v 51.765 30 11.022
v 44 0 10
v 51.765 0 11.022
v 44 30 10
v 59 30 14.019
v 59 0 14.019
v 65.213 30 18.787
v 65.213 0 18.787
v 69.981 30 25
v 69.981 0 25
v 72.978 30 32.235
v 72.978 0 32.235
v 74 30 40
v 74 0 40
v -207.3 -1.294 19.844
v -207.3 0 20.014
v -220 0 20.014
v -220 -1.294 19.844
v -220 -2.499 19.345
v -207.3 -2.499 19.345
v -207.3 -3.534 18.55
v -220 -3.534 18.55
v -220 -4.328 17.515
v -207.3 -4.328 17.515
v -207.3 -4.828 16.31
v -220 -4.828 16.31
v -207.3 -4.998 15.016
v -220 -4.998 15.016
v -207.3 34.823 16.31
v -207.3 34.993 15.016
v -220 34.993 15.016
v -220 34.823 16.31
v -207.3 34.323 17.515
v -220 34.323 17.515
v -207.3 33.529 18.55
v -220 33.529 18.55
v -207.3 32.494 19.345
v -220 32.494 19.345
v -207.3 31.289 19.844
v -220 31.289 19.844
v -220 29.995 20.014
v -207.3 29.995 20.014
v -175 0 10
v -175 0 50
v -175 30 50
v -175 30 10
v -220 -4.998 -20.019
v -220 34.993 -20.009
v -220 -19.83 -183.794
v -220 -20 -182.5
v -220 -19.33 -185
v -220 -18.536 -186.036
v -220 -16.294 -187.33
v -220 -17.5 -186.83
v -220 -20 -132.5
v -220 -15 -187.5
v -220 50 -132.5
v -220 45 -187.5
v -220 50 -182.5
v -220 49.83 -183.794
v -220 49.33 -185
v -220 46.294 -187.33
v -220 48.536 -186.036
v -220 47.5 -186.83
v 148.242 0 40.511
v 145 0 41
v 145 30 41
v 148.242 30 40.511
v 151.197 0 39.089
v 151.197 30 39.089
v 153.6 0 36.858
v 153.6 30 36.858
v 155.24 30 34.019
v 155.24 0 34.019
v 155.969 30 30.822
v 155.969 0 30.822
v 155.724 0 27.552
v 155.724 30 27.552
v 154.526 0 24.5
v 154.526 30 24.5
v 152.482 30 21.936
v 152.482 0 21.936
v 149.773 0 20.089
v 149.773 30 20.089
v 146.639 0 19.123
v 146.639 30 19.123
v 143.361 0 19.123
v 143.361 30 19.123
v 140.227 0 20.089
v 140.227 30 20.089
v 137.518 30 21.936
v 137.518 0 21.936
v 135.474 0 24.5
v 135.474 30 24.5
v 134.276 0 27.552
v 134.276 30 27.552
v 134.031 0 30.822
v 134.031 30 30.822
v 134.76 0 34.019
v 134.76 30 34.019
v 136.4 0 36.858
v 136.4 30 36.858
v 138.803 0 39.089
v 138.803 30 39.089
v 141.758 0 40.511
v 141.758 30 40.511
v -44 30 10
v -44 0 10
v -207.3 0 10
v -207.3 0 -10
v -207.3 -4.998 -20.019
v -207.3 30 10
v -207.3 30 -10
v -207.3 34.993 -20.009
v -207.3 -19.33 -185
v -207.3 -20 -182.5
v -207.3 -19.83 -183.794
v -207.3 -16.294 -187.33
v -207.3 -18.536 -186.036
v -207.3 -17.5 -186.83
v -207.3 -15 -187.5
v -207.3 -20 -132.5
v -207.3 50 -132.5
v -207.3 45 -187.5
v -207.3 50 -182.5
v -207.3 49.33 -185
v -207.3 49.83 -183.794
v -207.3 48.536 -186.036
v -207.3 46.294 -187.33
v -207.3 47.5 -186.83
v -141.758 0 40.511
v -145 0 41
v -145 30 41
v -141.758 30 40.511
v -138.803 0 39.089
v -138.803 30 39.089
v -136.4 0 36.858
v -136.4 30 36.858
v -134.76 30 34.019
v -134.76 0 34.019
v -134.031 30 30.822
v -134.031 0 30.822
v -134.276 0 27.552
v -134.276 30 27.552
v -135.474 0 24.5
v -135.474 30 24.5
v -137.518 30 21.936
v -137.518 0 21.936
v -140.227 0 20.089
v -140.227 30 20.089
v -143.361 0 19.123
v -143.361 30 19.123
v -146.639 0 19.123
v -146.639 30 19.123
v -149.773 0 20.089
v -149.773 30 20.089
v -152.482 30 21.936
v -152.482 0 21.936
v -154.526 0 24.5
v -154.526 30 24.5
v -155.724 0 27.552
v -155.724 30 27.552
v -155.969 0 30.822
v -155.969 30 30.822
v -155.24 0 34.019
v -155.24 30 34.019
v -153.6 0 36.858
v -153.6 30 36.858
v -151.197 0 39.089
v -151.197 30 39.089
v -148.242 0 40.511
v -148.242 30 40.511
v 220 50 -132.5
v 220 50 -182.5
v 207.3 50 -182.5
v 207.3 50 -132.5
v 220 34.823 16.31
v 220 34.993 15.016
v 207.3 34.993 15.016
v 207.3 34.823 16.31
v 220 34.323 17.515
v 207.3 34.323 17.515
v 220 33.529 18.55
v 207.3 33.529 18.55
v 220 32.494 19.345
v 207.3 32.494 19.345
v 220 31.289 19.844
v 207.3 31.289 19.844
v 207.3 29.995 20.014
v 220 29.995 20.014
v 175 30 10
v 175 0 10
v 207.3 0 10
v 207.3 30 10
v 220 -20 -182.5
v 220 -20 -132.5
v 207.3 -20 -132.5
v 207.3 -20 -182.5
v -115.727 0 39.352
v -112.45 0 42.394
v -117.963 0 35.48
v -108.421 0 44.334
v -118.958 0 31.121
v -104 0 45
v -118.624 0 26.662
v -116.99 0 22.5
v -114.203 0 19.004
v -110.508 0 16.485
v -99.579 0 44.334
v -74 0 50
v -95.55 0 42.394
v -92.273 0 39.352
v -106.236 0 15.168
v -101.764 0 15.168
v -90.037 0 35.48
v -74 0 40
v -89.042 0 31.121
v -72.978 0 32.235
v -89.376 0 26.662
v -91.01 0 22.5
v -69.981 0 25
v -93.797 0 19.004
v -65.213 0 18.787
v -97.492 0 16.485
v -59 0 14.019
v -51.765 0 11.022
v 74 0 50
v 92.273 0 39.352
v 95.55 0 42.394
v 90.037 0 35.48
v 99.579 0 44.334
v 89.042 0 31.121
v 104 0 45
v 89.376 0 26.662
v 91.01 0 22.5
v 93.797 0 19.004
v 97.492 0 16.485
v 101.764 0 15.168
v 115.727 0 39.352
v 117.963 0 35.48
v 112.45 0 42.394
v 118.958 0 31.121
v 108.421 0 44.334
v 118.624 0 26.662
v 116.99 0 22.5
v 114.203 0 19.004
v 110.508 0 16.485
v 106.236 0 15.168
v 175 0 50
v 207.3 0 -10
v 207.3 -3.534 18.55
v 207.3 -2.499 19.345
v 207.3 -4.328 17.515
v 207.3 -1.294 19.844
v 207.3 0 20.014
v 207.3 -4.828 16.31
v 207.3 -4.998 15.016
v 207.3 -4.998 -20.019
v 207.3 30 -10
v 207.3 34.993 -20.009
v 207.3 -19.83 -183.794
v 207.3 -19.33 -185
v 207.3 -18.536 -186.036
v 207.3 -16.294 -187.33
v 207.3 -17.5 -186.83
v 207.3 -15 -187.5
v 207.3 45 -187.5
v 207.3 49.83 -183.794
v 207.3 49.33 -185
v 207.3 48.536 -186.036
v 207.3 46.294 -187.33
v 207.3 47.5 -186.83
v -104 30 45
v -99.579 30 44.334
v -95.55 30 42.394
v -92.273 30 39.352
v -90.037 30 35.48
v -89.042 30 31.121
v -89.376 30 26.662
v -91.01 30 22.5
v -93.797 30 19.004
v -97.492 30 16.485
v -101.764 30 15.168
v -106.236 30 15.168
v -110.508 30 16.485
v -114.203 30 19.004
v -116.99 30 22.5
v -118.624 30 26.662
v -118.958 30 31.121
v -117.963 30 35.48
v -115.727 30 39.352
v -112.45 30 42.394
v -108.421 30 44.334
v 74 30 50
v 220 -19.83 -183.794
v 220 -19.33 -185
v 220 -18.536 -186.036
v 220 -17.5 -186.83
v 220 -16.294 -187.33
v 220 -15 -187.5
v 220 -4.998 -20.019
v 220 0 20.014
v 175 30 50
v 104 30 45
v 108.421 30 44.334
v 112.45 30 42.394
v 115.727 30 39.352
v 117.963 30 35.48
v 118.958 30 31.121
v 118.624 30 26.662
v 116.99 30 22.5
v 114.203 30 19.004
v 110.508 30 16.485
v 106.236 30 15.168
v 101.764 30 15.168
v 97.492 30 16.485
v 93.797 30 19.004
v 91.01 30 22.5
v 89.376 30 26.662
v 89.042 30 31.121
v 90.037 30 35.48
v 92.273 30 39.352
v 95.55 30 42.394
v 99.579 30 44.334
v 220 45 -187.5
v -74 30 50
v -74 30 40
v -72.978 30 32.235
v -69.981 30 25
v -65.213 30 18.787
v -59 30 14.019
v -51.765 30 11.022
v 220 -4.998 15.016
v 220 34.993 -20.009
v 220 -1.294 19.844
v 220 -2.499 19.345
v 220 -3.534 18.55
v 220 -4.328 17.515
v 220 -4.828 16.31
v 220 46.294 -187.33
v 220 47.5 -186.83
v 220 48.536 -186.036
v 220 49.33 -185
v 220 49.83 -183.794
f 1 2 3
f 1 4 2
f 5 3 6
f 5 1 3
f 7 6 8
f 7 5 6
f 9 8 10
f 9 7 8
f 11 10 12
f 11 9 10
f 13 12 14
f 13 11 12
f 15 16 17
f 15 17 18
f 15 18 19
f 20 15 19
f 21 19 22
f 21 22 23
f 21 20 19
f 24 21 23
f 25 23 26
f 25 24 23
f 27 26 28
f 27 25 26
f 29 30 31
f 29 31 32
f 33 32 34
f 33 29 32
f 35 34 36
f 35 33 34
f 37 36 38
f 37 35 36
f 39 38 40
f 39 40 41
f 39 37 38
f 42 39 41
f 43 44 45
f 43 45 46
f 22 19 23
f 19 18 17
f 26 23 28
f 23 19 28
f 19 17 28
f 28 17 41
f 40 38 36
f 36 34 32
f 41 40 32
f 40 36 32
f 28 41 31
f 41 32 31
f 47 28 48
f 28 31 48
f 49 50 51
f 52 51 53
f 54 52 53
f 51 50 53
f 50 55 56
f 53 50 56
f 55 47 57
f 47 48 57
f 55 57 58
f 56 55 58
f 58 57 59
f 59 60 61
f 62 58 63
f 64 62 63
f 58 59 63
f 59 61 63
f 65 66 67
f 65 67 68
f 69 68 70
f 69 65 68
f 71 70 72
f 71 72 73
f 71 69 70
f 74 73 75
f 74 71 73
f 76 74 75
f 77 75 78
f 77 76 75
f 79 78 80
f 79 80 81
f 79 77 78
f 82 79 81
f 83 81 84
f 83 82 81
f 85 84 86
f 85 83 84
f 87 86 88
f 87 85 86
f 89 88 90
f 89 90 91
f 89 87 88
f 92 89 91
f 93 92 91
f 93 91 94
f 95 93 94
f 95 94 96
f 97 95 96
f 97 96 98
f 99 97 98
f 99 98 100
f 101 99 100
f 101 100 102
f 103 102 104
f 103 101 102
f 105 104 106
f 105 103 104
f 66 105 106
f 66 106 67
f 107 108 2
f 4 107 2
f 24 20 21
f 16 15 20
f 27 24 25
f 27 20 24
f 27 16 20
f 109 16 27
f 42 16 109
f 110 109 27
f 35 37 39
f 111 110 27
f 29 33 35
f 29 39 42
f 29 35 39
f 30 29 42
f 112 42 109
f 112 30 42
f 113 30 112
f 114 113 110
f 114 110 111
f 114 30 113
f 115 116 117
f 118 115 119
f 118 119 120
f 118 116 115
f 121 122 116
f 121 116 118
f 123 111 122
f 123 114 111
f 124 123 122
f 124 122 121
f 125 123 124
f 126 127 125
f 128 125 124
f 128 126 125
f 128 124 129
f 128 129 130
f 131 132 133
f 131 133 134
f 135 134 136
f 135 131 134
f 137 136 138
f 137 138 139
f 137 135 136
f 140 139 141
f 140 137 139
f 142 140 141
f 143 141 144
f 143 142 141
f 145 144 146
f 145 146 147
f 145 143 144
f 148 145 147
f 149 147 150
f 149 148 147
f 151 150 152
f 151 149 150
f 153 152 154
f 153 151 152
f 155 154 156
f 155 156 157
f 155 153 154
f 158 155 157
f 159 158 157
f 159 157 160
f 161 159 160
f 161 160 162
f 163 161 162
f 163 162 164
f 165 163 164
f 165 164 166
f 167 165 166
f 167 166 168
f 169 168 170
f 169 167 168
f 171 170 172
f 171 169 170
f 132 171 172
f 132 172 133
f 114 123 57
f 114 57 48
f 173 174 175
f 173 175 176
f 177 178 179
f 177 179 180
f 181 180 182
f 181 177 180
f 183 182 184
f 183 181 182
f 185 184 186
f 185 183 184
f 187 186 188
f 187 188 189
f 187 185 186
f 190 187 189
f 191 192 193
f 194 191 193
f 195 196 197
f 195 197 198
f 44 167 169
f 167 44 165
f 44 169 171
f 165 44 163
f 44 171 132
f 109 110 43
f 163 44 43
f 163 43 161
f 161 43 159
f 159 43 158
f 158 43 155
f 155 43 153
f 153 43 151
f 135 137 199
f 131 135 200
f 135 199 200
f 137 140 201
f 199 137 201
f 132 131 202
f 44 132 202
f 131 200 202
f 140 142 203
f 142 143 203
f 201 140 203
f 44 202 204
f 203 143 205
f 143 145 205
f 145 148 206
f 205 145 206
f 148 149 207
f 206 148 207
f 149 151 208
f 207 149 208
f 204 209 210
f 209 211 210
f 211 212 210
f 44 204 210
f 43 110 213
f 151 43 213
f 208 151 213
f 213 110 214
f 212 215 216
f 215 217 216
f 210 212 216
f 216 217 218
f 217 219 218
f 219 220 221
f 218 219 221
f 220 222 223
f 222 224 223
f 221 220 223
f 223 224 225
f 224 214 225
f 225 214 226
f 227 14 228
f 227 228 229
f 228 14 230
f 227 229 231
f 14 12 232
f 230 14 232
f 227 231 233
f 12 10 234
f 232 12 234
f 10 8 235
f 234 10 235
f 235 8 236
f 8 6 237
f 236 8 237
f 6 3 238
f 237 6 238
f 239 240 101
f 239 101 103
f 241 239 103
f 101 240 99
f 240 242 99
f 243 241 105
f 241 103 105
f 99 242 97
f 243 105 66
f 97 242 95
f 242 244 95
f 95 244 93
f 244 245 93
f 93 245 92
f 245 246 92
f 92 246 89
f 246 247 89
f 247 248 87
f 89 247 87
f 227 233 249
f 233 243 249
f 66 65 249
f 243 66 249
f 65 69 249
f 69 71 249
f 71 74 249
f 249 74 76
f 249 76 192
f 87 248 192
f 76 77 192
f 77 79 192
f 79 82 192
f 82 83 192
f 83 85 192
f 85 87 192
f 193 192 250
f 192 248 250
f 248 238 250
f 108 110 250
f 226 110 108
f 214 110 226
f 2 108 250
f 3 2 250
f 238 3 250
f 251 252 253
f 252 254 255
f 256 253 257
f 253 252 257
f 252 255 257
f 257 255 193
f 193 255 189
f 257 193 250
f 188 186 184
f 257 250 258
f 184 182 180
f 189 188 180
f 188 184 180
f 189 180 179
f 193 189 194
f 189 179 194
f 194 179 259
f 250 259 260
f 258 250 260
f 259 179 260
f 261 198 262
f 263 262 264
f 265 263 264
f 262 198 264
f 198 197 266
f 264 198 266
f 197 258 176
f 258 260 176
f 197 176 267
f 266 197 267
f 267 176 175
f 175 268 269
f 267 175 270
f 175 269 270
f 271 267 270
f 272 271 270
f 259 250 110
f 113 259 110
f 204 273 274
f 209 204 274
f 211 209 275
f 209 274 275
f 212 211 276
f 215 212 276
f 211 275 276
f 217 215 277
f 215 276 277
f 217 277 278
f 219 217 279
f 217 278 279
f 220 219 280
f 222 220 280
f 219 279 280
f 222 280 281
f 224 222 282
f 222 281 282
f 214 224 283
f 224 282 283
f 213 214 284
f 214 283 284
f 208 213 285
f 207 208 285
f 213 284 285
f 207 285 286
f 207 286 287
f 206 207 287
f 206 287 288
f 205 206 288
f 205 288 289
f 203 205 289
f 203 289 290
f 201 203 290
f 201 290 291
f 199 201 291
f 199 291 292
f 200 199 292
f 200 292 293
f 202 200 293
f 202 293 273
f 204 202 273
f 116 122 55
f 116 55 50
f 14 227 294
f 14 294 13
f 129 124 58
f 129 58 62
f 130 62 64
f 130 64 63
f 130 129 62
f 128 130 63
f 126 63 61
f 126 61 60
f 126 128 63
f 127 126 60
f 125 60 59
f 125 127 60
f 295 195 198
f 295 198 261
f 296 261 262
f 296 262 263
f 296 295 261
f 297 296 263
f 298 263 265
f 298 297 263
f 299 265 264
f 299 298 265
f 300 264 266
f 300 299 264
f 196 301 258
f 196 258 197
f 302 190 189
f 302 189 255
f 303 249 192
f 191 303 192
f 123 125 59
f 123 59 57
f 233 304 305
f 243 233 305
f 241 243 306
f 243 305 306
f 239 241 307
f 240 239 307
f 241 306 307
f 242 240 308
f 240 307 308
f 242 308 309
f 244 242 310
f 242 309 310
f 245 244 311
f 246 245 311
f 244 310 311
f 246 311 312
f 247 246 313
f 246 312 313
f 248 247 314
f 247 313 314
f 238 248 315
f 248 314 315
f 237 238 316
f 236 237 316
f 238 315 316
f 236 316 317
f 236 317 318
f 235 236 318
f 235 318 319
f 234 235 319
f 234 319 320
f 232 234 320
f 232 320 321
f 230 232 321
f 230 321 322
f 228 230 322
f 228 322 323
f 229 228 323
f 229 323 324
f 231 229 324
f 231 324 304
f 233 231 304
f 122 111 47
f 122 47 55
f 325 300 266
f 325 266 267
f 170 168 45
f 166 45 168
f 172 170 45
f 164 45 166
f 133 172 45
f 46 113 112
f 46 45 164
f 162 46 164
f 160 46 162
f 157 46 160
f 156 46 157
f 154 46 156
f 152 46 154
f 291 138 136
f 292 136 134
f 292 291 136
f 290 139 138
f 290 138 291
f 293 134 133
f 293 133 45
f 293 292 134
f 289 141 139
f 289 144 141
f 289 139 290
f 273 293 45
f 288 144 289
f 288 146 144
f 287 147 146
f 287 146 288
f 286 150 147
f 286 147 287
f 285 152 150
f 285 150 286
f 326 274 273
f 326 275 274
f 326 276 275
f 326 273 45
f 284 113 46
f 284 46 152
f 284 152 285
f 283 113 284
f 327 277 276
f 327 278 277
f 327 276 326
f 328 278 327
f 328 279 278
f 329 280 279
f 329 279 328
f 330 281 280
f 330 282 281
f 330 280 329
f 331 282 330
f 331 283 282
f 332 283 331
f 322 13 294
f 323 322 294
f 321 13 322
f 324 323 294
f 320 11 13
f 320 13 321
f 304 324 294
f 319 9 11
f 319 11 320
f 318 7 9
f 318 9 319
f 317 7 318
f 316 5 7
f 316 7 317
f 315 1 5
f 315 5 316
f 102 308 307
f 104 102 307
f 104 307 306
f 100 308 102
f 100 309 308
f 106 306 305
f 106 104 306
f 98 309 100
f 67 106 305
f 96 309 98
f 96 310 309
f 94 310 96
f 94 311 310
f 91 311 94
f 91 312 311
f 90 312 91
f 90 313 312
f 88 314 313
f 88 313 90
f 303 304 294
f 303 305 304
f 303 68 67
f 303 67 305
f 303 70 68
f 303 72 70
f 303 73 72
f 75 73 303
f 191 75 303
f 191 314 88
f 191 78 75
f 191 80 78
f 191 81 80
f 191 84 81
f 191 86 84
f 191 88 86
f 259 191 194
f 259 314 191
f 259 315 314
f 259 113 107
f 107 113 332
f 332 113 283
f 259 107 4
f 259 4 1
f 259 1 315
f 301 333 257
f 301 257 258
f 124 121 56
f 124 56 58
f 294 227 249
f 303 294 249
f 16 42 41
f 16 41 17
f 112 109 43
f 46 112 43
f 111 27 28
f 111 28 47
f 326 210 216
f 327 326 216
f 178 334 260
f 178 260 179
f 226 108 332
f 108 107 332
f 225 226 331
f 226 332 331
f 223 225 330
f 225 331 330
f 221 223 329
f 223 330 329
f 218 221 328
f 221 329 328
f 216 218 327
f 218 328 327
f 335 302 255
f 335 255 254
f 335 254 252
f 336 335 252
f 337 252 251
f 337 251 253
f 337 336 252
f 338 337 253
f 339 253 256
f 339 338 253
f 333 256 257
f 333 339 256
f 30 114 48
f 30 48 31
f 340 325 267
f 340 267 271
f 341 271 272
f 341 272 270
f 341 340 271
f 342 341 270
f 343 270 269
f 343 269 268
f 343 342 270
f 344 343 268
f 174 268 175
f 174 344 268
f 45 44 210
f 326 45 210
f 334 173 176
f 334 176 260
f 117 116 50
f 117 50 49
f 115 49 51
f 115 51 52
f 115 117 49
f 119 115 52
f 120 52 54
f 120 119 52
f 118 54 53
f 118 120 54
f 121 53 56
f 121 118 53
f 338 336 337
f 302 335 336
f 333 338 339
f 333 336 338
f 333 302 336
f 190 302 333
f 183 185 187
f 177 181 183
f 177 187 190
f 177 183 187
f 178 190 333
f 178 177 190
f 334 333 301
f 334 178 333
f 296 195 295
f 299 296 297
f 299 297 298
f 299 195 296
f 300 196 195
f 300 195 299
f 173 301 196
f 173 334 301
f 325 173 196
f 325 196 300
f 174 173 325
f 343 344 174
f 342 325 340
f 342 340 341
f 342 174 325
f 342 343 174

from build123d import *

# Parameters (mm, degrees)
SKETCH1_W           = 101
SKETCH1_H           = 40
SKETCH1_R           = 11
SKETCH1_R_2         = 10
BOSS_EXTRUDE1_DEPTH = 30
FILLET1_R           = 30
FILLET2_R           = 30
BOSS_EXTRUDE2_DEPTH = 12.7
LPATTERN2_COUNT     = 2
LPATTERN2_PITCH     = 427.3
CUT_EXTRUDE1_REACH  = 295.353
SKETCH3_R           = 15


with BuildPart() as part:
    # Sketch1 → Boss-Extrude1 (new body)
    # profile 1 of 3: a face of its own
    with BuildSketch(Plane(origin=(0, 0, 0), x_dir=(1, 0, 0), z_dir=(0, 1, 0))):
        with Locations((-124.5, -30)):
            Rectangle(SKETCH1_W, SKETCH1_H)
        with Locations(Location((-145, -30, 0), (0, 0, 270))):
            Circle(SKETCH1_R, mode=Mode.SUBTRACT)
        with Locations(Location((-104, -30, 0), (0, 0, 270))):
            Circle(SKETCH1_R_2, mode=Mode.SUBTRACT)
    # profile 2 of 3: a face of its own
    with BuildSketch(Plane(origin=(0, 0, 0), x_dir=(1, 0, 0), z_dir=(0, 1, 0))):
        Polygon((220, 10), (-220, 10), (-220, -10), (-217.730894996, -10), (-215.497523929, -10), (-204.607421626, -10), (-182.730894996, -10), (-175, -10), (-74, -10), (74, -10), (175, -10), (220, -10), align=None)
    # profile 3 of 3: a face of its own
    with BuildSketch(Plane(origin=(0, 0, 0), x_dir=(1, 0, 0), z_dir=(0, 1, 0))):
        with Locations((124.5, -30)):
            Rectangle(SKETCH1_W, SKETCH1_H)
        with Locations(Location((104, -30, 0), (0, 0, 270))):
            Circle(SKETCH1_R_2, mode=Mode.SUBTRACT)
        with Locations(Location((145, -30, 0), (0, 0, 270))):
            Circle(SKETCH1_R, mode=Mode.SUBTRACT)
    extrude(amount=BOSS_EXTRUDE1_DEPTH)

    # Fillet1
    fillet1_edges = [part.edges().sort_by_distance(p)[0] for p in [
        (-74, 15, 10),
    ]]
    fillet(fillet1_edges, radius=FILLET1_R)

    # Fillet2
    fillet2_edges = [part.edges().sort_by_distance(p)[0] for p in [
        (74, 15, 10),
    ]]
    fillet(fillet2_edges, radius=FILLET2_R)

    # Sketch2 → Boss-Extrude2 (add)
    with BuildSketch(Plane(origin=(220, 0, 0), x_dir=(0, 0, -1), z_dir=(1, 0, 0))):
        with BuildLine():
            Line((20.00915922, 34.992960702), (-15.016204221, 34.992960702))
            ThreePointArc((-15.016204221, 34.992960702), (-18.550303731, 33.529088755), (-20.014175678, 29.994989245))
            Line((-20.014175678, 29.994989245), (-20.014175678, -1.642e-06))
            ThreePointArc((-20.014175678, -1.642e-06), (-18.550303731, -3.534101152), (-15.016204221, -4.997973099))
            Line((-15.016204221, -4.997973099), (20.019193394, -4.997973099))
            Line((20.019193394, -4.997973099), (132.5, -20))
            Line((132.5, -20), (182.5, -20))
            ThreePointArc((182.5, -20), (186.035533906, -18.535533906), (187.5, -15))
            Line((187.5, -15), (187.5, 45))
            ThreePointArc((187.5, 45), (186.035533906, 48.535533906), (182.5, 50))
            Line((182.5, 50), (132.5, 50))
            Line((132.5, 50), (20.00915922, 34.992960702))
        make_face()
    boss_extrude2 = extrude(amount=-BOSS_EXTRUDE2_DEPTH)

    # LPattern2: Boss-Extrude2 ×2
    with Locations(*[(-i * LPATTERN2_PITCH, 0, 0) for i in range(1, LPATTERN2_COUNT)]):
        add(boss_extrude2)

    # Sketch3 → Cut-Extrude1 (cut, up to next)
    with BuildSketch(Plane(origin=(0, 30, 0), x_dir=(1, 0, 0), z_dir=(0, 1, 0)), mode=Mode.PRIVATE) as cut_extrude1_sk1:
        with Locations(Location((-104, -30, 0), (0, 0, 270))):
            Circle(SKETCH3_R)
    cut_extrude1_tool1 = extrude(cut_extrude1_sk1.sketch, amount=-CUT_EXTRUDE1_REACH, mode=Mode.PRIVATE) & part.part
    # Sketch3 → Cut-Extrude1 (cut, up to next)
    with BuildSketch(Plane(origin=(0, 30, 0), x_dir=(1, 0, 0), z_dir=(0, 1, 0)), mode=Mode.PRIVATE) as cut_extrude1_sk2:
        with Locations(Location((104, -30, 0), (0, 0, 270))):
            Circle(SKETCH3_R)
    cut_extrude1_tool2 = extrude(cut_extrude1_sk2.sketch, amount=-CUT_EXTRUDE1_REACH, mode=Mode.PRIVATE) & part.part
    add(cut_extrude1_tool1.solids().sort_by_distance((-104, 30, 30))[0], mode=Mode.SUBTRACT)
    add(cut_extrude1_tool2.solids().sort_by_distance((104, 30, 30))[0], mode=Mode.SUBTRACT)


solid = part.part
